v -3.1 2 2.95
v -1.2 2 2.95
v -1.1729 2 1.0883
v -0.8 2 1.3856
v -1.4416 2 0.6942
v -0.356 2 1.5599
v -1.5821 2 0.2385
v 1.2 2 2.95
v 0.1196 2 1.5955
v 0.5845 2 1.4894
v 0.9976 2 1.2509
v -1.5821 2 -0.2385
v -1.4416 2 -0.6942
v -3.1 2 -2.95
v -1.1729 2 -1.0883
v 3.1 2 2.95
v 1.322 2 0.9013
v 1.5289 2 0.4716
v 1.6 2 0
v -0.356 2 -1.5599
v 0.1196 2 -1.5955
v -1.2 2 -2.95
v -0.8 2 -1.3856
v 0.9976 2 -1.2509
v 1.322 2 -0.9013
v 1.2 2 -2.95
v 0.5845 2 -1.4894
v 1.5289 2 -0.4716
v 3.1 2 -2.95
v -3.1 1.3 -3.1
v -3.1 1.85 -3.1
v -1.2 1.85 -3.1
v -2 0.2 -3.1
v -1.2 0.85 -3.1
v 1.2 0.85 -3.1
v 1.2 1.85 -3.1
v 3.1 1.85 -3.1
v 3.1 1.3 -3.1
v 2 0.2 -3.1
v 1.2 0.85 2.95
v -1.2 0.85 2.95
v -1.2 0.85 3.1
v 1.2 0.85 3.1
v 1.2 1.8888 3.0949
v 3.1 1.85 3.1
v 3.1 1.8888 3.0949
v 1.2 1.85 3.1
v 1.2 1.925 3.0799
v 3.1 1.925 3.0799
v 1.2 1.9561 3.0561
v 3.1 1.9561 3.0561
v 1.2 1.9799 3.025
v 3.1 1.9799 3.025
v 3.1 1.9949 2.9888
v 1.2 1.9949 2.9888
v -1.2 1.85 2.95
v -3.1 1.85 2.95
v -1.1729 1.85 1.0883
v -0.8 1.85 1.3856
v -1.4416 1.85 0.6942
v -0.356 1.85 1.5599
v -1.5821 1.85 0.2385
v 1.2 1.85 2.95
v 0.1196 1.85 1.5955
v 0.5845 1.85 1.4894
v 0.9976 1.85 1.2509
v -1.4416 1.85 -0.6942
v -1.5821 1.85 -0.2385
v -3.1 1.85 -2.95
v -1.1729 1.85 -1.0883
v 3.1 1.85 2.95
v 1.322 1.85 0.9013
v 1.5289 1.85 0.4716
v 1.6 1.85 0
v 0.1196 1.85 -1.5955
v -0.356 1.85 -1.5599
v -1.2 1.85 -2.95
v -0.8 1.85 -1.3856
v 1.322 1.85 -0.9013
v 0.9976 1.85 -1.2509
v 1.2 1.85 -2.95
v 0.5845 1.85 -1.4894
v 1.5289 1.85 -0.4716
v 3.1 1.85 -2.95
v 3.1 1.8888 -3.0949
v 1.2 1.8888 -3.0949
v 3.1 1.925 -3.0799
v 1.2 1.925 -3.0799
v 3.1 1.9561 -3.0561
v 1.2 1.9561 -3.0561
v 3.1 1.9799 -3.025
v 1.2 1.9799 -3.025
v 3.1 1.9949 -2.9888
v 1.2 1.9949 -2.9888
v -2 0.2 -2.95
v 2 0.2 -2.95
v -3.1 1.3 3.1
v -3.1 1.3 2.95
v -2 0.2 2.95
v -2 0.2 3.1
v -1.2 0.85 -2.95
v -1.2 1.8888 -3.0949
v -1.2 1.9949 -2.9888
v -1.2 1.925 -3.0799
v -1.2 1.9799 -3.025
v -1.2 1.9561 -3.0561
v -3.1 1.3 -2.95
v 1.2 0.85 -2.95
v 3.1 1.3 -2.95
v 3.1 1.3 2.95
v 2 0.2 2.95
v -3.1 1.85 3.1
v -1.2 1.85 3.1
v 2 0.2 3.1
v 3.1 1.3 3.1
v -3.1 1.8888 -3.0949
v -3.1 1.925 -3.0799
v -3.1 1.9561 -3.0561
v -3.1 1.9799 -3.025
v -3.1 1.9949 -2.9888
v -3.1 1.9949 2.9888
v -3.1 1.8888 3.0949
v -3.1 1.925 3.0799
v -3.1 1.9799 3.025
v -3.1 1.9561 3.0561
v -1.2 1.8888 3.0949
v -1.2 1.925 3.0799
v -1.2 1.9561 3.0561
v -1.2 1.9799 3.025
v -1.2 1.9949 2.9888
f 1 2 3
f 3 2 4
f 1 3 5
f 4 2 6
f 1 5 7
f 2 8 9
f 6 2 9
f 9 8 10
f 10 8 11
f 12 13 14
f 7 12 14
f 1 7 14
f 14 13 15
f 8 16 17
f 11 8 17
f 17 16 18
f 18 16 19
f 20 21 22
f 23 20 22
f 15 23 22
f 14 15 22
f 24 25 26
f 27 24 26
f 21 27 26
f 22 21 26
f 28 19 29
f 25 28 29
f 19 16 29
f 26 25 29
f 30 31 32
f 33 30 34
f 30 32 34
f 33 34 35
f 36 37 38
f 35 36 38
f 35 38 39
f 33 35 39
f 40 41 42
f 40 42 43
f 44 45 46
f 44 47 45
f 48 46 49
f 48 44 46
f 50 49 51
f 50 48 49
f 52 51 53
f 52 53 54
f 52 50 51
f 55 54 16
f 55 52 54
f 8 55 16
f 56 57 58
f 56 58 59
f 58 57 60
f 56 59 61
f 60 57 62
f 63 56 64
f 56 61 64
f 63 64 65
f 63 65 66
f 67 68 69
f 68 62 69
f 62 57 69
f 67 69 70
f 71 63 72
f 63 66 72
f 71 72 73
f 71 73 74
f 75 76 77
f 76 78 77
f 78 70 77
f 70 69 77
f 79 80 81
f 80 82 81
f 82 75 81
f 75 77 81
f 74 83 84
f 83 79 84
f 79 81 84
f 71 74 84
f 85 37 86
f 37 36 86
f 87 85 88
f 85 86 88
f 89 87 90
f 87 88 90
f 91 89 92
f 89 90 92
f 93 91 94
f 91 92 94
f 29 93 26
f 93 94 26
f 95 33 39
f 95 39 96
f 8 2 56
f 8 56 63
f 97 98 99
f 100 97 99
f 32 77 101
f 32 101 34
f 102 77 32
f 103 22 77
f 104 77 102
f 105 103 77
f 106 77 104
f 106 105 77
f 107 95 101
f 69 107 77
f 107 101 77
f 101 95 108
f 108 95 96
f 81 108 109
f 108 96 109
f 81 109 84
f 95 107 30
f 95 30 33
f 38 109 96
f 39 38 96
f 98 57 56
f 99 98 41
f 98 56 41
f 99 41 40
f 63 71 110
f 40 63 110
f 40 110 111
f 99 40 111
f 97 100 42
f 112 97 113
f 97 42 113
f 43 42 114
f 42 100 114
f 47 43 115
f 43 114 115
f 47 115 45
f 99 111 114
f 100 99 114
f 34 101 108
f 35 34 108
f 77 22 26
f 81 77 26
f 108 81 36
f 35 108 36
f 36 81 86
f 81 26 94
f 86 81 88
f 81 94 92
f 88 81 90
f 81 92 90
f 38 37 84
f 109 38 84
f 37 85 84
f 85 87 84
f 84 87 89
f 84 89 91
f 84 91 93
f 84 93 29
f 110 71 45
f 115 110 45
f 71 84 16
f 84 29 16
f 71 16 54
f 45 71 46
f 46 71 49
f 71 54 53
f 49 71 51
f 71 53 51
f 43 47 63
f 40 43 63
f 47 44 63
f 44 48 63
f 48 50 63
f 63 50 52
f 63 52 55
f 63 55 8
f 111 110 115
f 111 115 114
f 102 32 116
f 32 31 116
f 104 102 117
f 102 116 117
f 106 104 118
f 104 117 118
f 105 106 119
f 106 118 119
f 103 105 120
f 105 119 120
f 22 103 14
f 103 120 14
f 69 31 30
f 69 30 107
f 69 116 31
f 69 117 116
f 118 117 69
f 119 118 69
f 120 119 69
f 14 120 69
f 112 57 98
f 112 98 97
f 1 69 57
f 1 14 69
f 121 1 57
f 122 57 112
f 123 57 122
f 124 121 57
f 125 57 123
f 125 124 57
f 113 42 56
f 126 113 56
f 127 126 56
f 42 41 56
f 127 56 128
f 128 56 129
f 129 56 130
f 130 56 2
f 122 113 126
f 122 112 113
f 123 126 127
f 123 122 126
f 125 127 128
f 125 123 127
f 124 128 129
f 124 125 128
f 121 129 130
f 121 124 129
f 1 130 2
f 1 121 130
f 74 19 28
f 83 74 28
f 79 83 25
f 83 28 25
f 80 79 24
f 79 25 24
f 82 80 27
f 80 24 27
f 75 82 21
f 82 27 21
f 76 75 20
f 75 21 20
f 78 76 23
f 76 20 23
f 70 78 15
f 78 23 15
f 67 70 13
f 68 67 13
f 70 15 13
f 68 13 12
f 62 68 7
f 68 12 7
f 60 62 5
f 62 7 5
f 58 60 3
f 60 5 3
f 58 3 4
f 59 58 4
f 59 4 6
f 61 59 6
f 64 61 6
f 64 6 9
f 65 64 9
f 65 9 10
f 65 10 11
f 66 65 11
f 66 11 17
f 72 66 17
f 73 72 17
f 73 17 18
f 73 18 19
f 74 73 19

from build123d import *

# Parameters (mm, degrees)
EXTRUDE_THIN3_DEPTH     = 3.1
SKETCH2_W               = 2.4
SKETCH2_H               = 1
CUT_EXTRUDE1_DEPTH      = 4.1
CUT_EXTRUDE1_DEPTH_BACK = 4.1
SKETCH3_W               = 2.4
SKETCH3_H               = 0.15
CUT_EXTRUDE2_DEPTH      = 1
FILLET1_R               = 0.15
SKETCH4_R               = 1.6
CUT_EXTRUDE3_DEPTH      = 1


with BuildPart() as part:
    # Sketch1 → Extrude-Thin3 (new body, symmetric)
    with BuildSketch(Plane(origin=(0, 0, 0), x_dir=(0, 0, -1), z_dir=(1, 0, 0))):
        Polygon((-3.1, 0.2), (-3.1, 2), (3.1, 2), (3.1, 0.2), (2.95, 0.2), (2.95, 1.85), (-2.95, 1.85), (-2.95, 0.2), align=None)
    extrude(amount=EXTRUDE_THIN3_DEPTH, both=True)

    # Sketch2 → Cut-Extrude1 (cut, two sides)
    with BuildSketch(Plane.XY) as cut_extrude1_sk:
        with Locations((0, 1.35)):
            Rectangle(SKETCH2_W, SKETCH2_H)
        Polygon((-3.1, 1.3), (-2, 0.2), (-3.1, 0.2), align=None)
        Polygon((3.1, 0.2), (3.1, 1.3), (2, 0.2), align=None)
    extrude(amount=CUT_EXTRUDE1_DEPTH, mode=Mode.SUBTRACT)
    extrude(cut_extrude1_sk.sketch, amount=-CUT_EXTRUDE1_DEPTH_BACK, mode=Mode.SUBTRACT)

    # Sketch3 → Cut-Extrude2 (cut)
    with BuildSketch(Plane(origin=(0, 2, 0), x_dir=(1, 0, 0), z_dir=(0, 1, 0))):
        with Locations((0, 3.025)):
            Rectangle(SKETCH3_W, SKETCH3_H)
        with Locations((0, -3.025)):
            Rectangle(SKETCH3_W, SKETCH3_H)
    extrude(amount=-CUT_EXTRUDE2_DEPTH, mode=Mode.SUBTRACT)

    # Fillet1
    fillet1_edges = [part.edges().sort_by_distance(p)[0] for p in [
        (-2.15, 2, -3.1),
        (2.15, 2, -3.1),
        (-2.15, 2, 3.1),
        (2.15, 2, 3.1),
    ]]
    fillet(fillet1_edges, radius=FILLET1_R)

    # Sketch4 → Cut-Extrude3 (cut)
    with BuildSketch(Plane(origin=(0, 2, 0), x_dir=(1, 0, 0), z_dir=(0, 1, 0))):
        Circle(SKETCH4_R)
    extrude(amount=-CUT_EXTRUDE3_DEPTH, mode=Mode.SUBTRACT)


solid = part.part
